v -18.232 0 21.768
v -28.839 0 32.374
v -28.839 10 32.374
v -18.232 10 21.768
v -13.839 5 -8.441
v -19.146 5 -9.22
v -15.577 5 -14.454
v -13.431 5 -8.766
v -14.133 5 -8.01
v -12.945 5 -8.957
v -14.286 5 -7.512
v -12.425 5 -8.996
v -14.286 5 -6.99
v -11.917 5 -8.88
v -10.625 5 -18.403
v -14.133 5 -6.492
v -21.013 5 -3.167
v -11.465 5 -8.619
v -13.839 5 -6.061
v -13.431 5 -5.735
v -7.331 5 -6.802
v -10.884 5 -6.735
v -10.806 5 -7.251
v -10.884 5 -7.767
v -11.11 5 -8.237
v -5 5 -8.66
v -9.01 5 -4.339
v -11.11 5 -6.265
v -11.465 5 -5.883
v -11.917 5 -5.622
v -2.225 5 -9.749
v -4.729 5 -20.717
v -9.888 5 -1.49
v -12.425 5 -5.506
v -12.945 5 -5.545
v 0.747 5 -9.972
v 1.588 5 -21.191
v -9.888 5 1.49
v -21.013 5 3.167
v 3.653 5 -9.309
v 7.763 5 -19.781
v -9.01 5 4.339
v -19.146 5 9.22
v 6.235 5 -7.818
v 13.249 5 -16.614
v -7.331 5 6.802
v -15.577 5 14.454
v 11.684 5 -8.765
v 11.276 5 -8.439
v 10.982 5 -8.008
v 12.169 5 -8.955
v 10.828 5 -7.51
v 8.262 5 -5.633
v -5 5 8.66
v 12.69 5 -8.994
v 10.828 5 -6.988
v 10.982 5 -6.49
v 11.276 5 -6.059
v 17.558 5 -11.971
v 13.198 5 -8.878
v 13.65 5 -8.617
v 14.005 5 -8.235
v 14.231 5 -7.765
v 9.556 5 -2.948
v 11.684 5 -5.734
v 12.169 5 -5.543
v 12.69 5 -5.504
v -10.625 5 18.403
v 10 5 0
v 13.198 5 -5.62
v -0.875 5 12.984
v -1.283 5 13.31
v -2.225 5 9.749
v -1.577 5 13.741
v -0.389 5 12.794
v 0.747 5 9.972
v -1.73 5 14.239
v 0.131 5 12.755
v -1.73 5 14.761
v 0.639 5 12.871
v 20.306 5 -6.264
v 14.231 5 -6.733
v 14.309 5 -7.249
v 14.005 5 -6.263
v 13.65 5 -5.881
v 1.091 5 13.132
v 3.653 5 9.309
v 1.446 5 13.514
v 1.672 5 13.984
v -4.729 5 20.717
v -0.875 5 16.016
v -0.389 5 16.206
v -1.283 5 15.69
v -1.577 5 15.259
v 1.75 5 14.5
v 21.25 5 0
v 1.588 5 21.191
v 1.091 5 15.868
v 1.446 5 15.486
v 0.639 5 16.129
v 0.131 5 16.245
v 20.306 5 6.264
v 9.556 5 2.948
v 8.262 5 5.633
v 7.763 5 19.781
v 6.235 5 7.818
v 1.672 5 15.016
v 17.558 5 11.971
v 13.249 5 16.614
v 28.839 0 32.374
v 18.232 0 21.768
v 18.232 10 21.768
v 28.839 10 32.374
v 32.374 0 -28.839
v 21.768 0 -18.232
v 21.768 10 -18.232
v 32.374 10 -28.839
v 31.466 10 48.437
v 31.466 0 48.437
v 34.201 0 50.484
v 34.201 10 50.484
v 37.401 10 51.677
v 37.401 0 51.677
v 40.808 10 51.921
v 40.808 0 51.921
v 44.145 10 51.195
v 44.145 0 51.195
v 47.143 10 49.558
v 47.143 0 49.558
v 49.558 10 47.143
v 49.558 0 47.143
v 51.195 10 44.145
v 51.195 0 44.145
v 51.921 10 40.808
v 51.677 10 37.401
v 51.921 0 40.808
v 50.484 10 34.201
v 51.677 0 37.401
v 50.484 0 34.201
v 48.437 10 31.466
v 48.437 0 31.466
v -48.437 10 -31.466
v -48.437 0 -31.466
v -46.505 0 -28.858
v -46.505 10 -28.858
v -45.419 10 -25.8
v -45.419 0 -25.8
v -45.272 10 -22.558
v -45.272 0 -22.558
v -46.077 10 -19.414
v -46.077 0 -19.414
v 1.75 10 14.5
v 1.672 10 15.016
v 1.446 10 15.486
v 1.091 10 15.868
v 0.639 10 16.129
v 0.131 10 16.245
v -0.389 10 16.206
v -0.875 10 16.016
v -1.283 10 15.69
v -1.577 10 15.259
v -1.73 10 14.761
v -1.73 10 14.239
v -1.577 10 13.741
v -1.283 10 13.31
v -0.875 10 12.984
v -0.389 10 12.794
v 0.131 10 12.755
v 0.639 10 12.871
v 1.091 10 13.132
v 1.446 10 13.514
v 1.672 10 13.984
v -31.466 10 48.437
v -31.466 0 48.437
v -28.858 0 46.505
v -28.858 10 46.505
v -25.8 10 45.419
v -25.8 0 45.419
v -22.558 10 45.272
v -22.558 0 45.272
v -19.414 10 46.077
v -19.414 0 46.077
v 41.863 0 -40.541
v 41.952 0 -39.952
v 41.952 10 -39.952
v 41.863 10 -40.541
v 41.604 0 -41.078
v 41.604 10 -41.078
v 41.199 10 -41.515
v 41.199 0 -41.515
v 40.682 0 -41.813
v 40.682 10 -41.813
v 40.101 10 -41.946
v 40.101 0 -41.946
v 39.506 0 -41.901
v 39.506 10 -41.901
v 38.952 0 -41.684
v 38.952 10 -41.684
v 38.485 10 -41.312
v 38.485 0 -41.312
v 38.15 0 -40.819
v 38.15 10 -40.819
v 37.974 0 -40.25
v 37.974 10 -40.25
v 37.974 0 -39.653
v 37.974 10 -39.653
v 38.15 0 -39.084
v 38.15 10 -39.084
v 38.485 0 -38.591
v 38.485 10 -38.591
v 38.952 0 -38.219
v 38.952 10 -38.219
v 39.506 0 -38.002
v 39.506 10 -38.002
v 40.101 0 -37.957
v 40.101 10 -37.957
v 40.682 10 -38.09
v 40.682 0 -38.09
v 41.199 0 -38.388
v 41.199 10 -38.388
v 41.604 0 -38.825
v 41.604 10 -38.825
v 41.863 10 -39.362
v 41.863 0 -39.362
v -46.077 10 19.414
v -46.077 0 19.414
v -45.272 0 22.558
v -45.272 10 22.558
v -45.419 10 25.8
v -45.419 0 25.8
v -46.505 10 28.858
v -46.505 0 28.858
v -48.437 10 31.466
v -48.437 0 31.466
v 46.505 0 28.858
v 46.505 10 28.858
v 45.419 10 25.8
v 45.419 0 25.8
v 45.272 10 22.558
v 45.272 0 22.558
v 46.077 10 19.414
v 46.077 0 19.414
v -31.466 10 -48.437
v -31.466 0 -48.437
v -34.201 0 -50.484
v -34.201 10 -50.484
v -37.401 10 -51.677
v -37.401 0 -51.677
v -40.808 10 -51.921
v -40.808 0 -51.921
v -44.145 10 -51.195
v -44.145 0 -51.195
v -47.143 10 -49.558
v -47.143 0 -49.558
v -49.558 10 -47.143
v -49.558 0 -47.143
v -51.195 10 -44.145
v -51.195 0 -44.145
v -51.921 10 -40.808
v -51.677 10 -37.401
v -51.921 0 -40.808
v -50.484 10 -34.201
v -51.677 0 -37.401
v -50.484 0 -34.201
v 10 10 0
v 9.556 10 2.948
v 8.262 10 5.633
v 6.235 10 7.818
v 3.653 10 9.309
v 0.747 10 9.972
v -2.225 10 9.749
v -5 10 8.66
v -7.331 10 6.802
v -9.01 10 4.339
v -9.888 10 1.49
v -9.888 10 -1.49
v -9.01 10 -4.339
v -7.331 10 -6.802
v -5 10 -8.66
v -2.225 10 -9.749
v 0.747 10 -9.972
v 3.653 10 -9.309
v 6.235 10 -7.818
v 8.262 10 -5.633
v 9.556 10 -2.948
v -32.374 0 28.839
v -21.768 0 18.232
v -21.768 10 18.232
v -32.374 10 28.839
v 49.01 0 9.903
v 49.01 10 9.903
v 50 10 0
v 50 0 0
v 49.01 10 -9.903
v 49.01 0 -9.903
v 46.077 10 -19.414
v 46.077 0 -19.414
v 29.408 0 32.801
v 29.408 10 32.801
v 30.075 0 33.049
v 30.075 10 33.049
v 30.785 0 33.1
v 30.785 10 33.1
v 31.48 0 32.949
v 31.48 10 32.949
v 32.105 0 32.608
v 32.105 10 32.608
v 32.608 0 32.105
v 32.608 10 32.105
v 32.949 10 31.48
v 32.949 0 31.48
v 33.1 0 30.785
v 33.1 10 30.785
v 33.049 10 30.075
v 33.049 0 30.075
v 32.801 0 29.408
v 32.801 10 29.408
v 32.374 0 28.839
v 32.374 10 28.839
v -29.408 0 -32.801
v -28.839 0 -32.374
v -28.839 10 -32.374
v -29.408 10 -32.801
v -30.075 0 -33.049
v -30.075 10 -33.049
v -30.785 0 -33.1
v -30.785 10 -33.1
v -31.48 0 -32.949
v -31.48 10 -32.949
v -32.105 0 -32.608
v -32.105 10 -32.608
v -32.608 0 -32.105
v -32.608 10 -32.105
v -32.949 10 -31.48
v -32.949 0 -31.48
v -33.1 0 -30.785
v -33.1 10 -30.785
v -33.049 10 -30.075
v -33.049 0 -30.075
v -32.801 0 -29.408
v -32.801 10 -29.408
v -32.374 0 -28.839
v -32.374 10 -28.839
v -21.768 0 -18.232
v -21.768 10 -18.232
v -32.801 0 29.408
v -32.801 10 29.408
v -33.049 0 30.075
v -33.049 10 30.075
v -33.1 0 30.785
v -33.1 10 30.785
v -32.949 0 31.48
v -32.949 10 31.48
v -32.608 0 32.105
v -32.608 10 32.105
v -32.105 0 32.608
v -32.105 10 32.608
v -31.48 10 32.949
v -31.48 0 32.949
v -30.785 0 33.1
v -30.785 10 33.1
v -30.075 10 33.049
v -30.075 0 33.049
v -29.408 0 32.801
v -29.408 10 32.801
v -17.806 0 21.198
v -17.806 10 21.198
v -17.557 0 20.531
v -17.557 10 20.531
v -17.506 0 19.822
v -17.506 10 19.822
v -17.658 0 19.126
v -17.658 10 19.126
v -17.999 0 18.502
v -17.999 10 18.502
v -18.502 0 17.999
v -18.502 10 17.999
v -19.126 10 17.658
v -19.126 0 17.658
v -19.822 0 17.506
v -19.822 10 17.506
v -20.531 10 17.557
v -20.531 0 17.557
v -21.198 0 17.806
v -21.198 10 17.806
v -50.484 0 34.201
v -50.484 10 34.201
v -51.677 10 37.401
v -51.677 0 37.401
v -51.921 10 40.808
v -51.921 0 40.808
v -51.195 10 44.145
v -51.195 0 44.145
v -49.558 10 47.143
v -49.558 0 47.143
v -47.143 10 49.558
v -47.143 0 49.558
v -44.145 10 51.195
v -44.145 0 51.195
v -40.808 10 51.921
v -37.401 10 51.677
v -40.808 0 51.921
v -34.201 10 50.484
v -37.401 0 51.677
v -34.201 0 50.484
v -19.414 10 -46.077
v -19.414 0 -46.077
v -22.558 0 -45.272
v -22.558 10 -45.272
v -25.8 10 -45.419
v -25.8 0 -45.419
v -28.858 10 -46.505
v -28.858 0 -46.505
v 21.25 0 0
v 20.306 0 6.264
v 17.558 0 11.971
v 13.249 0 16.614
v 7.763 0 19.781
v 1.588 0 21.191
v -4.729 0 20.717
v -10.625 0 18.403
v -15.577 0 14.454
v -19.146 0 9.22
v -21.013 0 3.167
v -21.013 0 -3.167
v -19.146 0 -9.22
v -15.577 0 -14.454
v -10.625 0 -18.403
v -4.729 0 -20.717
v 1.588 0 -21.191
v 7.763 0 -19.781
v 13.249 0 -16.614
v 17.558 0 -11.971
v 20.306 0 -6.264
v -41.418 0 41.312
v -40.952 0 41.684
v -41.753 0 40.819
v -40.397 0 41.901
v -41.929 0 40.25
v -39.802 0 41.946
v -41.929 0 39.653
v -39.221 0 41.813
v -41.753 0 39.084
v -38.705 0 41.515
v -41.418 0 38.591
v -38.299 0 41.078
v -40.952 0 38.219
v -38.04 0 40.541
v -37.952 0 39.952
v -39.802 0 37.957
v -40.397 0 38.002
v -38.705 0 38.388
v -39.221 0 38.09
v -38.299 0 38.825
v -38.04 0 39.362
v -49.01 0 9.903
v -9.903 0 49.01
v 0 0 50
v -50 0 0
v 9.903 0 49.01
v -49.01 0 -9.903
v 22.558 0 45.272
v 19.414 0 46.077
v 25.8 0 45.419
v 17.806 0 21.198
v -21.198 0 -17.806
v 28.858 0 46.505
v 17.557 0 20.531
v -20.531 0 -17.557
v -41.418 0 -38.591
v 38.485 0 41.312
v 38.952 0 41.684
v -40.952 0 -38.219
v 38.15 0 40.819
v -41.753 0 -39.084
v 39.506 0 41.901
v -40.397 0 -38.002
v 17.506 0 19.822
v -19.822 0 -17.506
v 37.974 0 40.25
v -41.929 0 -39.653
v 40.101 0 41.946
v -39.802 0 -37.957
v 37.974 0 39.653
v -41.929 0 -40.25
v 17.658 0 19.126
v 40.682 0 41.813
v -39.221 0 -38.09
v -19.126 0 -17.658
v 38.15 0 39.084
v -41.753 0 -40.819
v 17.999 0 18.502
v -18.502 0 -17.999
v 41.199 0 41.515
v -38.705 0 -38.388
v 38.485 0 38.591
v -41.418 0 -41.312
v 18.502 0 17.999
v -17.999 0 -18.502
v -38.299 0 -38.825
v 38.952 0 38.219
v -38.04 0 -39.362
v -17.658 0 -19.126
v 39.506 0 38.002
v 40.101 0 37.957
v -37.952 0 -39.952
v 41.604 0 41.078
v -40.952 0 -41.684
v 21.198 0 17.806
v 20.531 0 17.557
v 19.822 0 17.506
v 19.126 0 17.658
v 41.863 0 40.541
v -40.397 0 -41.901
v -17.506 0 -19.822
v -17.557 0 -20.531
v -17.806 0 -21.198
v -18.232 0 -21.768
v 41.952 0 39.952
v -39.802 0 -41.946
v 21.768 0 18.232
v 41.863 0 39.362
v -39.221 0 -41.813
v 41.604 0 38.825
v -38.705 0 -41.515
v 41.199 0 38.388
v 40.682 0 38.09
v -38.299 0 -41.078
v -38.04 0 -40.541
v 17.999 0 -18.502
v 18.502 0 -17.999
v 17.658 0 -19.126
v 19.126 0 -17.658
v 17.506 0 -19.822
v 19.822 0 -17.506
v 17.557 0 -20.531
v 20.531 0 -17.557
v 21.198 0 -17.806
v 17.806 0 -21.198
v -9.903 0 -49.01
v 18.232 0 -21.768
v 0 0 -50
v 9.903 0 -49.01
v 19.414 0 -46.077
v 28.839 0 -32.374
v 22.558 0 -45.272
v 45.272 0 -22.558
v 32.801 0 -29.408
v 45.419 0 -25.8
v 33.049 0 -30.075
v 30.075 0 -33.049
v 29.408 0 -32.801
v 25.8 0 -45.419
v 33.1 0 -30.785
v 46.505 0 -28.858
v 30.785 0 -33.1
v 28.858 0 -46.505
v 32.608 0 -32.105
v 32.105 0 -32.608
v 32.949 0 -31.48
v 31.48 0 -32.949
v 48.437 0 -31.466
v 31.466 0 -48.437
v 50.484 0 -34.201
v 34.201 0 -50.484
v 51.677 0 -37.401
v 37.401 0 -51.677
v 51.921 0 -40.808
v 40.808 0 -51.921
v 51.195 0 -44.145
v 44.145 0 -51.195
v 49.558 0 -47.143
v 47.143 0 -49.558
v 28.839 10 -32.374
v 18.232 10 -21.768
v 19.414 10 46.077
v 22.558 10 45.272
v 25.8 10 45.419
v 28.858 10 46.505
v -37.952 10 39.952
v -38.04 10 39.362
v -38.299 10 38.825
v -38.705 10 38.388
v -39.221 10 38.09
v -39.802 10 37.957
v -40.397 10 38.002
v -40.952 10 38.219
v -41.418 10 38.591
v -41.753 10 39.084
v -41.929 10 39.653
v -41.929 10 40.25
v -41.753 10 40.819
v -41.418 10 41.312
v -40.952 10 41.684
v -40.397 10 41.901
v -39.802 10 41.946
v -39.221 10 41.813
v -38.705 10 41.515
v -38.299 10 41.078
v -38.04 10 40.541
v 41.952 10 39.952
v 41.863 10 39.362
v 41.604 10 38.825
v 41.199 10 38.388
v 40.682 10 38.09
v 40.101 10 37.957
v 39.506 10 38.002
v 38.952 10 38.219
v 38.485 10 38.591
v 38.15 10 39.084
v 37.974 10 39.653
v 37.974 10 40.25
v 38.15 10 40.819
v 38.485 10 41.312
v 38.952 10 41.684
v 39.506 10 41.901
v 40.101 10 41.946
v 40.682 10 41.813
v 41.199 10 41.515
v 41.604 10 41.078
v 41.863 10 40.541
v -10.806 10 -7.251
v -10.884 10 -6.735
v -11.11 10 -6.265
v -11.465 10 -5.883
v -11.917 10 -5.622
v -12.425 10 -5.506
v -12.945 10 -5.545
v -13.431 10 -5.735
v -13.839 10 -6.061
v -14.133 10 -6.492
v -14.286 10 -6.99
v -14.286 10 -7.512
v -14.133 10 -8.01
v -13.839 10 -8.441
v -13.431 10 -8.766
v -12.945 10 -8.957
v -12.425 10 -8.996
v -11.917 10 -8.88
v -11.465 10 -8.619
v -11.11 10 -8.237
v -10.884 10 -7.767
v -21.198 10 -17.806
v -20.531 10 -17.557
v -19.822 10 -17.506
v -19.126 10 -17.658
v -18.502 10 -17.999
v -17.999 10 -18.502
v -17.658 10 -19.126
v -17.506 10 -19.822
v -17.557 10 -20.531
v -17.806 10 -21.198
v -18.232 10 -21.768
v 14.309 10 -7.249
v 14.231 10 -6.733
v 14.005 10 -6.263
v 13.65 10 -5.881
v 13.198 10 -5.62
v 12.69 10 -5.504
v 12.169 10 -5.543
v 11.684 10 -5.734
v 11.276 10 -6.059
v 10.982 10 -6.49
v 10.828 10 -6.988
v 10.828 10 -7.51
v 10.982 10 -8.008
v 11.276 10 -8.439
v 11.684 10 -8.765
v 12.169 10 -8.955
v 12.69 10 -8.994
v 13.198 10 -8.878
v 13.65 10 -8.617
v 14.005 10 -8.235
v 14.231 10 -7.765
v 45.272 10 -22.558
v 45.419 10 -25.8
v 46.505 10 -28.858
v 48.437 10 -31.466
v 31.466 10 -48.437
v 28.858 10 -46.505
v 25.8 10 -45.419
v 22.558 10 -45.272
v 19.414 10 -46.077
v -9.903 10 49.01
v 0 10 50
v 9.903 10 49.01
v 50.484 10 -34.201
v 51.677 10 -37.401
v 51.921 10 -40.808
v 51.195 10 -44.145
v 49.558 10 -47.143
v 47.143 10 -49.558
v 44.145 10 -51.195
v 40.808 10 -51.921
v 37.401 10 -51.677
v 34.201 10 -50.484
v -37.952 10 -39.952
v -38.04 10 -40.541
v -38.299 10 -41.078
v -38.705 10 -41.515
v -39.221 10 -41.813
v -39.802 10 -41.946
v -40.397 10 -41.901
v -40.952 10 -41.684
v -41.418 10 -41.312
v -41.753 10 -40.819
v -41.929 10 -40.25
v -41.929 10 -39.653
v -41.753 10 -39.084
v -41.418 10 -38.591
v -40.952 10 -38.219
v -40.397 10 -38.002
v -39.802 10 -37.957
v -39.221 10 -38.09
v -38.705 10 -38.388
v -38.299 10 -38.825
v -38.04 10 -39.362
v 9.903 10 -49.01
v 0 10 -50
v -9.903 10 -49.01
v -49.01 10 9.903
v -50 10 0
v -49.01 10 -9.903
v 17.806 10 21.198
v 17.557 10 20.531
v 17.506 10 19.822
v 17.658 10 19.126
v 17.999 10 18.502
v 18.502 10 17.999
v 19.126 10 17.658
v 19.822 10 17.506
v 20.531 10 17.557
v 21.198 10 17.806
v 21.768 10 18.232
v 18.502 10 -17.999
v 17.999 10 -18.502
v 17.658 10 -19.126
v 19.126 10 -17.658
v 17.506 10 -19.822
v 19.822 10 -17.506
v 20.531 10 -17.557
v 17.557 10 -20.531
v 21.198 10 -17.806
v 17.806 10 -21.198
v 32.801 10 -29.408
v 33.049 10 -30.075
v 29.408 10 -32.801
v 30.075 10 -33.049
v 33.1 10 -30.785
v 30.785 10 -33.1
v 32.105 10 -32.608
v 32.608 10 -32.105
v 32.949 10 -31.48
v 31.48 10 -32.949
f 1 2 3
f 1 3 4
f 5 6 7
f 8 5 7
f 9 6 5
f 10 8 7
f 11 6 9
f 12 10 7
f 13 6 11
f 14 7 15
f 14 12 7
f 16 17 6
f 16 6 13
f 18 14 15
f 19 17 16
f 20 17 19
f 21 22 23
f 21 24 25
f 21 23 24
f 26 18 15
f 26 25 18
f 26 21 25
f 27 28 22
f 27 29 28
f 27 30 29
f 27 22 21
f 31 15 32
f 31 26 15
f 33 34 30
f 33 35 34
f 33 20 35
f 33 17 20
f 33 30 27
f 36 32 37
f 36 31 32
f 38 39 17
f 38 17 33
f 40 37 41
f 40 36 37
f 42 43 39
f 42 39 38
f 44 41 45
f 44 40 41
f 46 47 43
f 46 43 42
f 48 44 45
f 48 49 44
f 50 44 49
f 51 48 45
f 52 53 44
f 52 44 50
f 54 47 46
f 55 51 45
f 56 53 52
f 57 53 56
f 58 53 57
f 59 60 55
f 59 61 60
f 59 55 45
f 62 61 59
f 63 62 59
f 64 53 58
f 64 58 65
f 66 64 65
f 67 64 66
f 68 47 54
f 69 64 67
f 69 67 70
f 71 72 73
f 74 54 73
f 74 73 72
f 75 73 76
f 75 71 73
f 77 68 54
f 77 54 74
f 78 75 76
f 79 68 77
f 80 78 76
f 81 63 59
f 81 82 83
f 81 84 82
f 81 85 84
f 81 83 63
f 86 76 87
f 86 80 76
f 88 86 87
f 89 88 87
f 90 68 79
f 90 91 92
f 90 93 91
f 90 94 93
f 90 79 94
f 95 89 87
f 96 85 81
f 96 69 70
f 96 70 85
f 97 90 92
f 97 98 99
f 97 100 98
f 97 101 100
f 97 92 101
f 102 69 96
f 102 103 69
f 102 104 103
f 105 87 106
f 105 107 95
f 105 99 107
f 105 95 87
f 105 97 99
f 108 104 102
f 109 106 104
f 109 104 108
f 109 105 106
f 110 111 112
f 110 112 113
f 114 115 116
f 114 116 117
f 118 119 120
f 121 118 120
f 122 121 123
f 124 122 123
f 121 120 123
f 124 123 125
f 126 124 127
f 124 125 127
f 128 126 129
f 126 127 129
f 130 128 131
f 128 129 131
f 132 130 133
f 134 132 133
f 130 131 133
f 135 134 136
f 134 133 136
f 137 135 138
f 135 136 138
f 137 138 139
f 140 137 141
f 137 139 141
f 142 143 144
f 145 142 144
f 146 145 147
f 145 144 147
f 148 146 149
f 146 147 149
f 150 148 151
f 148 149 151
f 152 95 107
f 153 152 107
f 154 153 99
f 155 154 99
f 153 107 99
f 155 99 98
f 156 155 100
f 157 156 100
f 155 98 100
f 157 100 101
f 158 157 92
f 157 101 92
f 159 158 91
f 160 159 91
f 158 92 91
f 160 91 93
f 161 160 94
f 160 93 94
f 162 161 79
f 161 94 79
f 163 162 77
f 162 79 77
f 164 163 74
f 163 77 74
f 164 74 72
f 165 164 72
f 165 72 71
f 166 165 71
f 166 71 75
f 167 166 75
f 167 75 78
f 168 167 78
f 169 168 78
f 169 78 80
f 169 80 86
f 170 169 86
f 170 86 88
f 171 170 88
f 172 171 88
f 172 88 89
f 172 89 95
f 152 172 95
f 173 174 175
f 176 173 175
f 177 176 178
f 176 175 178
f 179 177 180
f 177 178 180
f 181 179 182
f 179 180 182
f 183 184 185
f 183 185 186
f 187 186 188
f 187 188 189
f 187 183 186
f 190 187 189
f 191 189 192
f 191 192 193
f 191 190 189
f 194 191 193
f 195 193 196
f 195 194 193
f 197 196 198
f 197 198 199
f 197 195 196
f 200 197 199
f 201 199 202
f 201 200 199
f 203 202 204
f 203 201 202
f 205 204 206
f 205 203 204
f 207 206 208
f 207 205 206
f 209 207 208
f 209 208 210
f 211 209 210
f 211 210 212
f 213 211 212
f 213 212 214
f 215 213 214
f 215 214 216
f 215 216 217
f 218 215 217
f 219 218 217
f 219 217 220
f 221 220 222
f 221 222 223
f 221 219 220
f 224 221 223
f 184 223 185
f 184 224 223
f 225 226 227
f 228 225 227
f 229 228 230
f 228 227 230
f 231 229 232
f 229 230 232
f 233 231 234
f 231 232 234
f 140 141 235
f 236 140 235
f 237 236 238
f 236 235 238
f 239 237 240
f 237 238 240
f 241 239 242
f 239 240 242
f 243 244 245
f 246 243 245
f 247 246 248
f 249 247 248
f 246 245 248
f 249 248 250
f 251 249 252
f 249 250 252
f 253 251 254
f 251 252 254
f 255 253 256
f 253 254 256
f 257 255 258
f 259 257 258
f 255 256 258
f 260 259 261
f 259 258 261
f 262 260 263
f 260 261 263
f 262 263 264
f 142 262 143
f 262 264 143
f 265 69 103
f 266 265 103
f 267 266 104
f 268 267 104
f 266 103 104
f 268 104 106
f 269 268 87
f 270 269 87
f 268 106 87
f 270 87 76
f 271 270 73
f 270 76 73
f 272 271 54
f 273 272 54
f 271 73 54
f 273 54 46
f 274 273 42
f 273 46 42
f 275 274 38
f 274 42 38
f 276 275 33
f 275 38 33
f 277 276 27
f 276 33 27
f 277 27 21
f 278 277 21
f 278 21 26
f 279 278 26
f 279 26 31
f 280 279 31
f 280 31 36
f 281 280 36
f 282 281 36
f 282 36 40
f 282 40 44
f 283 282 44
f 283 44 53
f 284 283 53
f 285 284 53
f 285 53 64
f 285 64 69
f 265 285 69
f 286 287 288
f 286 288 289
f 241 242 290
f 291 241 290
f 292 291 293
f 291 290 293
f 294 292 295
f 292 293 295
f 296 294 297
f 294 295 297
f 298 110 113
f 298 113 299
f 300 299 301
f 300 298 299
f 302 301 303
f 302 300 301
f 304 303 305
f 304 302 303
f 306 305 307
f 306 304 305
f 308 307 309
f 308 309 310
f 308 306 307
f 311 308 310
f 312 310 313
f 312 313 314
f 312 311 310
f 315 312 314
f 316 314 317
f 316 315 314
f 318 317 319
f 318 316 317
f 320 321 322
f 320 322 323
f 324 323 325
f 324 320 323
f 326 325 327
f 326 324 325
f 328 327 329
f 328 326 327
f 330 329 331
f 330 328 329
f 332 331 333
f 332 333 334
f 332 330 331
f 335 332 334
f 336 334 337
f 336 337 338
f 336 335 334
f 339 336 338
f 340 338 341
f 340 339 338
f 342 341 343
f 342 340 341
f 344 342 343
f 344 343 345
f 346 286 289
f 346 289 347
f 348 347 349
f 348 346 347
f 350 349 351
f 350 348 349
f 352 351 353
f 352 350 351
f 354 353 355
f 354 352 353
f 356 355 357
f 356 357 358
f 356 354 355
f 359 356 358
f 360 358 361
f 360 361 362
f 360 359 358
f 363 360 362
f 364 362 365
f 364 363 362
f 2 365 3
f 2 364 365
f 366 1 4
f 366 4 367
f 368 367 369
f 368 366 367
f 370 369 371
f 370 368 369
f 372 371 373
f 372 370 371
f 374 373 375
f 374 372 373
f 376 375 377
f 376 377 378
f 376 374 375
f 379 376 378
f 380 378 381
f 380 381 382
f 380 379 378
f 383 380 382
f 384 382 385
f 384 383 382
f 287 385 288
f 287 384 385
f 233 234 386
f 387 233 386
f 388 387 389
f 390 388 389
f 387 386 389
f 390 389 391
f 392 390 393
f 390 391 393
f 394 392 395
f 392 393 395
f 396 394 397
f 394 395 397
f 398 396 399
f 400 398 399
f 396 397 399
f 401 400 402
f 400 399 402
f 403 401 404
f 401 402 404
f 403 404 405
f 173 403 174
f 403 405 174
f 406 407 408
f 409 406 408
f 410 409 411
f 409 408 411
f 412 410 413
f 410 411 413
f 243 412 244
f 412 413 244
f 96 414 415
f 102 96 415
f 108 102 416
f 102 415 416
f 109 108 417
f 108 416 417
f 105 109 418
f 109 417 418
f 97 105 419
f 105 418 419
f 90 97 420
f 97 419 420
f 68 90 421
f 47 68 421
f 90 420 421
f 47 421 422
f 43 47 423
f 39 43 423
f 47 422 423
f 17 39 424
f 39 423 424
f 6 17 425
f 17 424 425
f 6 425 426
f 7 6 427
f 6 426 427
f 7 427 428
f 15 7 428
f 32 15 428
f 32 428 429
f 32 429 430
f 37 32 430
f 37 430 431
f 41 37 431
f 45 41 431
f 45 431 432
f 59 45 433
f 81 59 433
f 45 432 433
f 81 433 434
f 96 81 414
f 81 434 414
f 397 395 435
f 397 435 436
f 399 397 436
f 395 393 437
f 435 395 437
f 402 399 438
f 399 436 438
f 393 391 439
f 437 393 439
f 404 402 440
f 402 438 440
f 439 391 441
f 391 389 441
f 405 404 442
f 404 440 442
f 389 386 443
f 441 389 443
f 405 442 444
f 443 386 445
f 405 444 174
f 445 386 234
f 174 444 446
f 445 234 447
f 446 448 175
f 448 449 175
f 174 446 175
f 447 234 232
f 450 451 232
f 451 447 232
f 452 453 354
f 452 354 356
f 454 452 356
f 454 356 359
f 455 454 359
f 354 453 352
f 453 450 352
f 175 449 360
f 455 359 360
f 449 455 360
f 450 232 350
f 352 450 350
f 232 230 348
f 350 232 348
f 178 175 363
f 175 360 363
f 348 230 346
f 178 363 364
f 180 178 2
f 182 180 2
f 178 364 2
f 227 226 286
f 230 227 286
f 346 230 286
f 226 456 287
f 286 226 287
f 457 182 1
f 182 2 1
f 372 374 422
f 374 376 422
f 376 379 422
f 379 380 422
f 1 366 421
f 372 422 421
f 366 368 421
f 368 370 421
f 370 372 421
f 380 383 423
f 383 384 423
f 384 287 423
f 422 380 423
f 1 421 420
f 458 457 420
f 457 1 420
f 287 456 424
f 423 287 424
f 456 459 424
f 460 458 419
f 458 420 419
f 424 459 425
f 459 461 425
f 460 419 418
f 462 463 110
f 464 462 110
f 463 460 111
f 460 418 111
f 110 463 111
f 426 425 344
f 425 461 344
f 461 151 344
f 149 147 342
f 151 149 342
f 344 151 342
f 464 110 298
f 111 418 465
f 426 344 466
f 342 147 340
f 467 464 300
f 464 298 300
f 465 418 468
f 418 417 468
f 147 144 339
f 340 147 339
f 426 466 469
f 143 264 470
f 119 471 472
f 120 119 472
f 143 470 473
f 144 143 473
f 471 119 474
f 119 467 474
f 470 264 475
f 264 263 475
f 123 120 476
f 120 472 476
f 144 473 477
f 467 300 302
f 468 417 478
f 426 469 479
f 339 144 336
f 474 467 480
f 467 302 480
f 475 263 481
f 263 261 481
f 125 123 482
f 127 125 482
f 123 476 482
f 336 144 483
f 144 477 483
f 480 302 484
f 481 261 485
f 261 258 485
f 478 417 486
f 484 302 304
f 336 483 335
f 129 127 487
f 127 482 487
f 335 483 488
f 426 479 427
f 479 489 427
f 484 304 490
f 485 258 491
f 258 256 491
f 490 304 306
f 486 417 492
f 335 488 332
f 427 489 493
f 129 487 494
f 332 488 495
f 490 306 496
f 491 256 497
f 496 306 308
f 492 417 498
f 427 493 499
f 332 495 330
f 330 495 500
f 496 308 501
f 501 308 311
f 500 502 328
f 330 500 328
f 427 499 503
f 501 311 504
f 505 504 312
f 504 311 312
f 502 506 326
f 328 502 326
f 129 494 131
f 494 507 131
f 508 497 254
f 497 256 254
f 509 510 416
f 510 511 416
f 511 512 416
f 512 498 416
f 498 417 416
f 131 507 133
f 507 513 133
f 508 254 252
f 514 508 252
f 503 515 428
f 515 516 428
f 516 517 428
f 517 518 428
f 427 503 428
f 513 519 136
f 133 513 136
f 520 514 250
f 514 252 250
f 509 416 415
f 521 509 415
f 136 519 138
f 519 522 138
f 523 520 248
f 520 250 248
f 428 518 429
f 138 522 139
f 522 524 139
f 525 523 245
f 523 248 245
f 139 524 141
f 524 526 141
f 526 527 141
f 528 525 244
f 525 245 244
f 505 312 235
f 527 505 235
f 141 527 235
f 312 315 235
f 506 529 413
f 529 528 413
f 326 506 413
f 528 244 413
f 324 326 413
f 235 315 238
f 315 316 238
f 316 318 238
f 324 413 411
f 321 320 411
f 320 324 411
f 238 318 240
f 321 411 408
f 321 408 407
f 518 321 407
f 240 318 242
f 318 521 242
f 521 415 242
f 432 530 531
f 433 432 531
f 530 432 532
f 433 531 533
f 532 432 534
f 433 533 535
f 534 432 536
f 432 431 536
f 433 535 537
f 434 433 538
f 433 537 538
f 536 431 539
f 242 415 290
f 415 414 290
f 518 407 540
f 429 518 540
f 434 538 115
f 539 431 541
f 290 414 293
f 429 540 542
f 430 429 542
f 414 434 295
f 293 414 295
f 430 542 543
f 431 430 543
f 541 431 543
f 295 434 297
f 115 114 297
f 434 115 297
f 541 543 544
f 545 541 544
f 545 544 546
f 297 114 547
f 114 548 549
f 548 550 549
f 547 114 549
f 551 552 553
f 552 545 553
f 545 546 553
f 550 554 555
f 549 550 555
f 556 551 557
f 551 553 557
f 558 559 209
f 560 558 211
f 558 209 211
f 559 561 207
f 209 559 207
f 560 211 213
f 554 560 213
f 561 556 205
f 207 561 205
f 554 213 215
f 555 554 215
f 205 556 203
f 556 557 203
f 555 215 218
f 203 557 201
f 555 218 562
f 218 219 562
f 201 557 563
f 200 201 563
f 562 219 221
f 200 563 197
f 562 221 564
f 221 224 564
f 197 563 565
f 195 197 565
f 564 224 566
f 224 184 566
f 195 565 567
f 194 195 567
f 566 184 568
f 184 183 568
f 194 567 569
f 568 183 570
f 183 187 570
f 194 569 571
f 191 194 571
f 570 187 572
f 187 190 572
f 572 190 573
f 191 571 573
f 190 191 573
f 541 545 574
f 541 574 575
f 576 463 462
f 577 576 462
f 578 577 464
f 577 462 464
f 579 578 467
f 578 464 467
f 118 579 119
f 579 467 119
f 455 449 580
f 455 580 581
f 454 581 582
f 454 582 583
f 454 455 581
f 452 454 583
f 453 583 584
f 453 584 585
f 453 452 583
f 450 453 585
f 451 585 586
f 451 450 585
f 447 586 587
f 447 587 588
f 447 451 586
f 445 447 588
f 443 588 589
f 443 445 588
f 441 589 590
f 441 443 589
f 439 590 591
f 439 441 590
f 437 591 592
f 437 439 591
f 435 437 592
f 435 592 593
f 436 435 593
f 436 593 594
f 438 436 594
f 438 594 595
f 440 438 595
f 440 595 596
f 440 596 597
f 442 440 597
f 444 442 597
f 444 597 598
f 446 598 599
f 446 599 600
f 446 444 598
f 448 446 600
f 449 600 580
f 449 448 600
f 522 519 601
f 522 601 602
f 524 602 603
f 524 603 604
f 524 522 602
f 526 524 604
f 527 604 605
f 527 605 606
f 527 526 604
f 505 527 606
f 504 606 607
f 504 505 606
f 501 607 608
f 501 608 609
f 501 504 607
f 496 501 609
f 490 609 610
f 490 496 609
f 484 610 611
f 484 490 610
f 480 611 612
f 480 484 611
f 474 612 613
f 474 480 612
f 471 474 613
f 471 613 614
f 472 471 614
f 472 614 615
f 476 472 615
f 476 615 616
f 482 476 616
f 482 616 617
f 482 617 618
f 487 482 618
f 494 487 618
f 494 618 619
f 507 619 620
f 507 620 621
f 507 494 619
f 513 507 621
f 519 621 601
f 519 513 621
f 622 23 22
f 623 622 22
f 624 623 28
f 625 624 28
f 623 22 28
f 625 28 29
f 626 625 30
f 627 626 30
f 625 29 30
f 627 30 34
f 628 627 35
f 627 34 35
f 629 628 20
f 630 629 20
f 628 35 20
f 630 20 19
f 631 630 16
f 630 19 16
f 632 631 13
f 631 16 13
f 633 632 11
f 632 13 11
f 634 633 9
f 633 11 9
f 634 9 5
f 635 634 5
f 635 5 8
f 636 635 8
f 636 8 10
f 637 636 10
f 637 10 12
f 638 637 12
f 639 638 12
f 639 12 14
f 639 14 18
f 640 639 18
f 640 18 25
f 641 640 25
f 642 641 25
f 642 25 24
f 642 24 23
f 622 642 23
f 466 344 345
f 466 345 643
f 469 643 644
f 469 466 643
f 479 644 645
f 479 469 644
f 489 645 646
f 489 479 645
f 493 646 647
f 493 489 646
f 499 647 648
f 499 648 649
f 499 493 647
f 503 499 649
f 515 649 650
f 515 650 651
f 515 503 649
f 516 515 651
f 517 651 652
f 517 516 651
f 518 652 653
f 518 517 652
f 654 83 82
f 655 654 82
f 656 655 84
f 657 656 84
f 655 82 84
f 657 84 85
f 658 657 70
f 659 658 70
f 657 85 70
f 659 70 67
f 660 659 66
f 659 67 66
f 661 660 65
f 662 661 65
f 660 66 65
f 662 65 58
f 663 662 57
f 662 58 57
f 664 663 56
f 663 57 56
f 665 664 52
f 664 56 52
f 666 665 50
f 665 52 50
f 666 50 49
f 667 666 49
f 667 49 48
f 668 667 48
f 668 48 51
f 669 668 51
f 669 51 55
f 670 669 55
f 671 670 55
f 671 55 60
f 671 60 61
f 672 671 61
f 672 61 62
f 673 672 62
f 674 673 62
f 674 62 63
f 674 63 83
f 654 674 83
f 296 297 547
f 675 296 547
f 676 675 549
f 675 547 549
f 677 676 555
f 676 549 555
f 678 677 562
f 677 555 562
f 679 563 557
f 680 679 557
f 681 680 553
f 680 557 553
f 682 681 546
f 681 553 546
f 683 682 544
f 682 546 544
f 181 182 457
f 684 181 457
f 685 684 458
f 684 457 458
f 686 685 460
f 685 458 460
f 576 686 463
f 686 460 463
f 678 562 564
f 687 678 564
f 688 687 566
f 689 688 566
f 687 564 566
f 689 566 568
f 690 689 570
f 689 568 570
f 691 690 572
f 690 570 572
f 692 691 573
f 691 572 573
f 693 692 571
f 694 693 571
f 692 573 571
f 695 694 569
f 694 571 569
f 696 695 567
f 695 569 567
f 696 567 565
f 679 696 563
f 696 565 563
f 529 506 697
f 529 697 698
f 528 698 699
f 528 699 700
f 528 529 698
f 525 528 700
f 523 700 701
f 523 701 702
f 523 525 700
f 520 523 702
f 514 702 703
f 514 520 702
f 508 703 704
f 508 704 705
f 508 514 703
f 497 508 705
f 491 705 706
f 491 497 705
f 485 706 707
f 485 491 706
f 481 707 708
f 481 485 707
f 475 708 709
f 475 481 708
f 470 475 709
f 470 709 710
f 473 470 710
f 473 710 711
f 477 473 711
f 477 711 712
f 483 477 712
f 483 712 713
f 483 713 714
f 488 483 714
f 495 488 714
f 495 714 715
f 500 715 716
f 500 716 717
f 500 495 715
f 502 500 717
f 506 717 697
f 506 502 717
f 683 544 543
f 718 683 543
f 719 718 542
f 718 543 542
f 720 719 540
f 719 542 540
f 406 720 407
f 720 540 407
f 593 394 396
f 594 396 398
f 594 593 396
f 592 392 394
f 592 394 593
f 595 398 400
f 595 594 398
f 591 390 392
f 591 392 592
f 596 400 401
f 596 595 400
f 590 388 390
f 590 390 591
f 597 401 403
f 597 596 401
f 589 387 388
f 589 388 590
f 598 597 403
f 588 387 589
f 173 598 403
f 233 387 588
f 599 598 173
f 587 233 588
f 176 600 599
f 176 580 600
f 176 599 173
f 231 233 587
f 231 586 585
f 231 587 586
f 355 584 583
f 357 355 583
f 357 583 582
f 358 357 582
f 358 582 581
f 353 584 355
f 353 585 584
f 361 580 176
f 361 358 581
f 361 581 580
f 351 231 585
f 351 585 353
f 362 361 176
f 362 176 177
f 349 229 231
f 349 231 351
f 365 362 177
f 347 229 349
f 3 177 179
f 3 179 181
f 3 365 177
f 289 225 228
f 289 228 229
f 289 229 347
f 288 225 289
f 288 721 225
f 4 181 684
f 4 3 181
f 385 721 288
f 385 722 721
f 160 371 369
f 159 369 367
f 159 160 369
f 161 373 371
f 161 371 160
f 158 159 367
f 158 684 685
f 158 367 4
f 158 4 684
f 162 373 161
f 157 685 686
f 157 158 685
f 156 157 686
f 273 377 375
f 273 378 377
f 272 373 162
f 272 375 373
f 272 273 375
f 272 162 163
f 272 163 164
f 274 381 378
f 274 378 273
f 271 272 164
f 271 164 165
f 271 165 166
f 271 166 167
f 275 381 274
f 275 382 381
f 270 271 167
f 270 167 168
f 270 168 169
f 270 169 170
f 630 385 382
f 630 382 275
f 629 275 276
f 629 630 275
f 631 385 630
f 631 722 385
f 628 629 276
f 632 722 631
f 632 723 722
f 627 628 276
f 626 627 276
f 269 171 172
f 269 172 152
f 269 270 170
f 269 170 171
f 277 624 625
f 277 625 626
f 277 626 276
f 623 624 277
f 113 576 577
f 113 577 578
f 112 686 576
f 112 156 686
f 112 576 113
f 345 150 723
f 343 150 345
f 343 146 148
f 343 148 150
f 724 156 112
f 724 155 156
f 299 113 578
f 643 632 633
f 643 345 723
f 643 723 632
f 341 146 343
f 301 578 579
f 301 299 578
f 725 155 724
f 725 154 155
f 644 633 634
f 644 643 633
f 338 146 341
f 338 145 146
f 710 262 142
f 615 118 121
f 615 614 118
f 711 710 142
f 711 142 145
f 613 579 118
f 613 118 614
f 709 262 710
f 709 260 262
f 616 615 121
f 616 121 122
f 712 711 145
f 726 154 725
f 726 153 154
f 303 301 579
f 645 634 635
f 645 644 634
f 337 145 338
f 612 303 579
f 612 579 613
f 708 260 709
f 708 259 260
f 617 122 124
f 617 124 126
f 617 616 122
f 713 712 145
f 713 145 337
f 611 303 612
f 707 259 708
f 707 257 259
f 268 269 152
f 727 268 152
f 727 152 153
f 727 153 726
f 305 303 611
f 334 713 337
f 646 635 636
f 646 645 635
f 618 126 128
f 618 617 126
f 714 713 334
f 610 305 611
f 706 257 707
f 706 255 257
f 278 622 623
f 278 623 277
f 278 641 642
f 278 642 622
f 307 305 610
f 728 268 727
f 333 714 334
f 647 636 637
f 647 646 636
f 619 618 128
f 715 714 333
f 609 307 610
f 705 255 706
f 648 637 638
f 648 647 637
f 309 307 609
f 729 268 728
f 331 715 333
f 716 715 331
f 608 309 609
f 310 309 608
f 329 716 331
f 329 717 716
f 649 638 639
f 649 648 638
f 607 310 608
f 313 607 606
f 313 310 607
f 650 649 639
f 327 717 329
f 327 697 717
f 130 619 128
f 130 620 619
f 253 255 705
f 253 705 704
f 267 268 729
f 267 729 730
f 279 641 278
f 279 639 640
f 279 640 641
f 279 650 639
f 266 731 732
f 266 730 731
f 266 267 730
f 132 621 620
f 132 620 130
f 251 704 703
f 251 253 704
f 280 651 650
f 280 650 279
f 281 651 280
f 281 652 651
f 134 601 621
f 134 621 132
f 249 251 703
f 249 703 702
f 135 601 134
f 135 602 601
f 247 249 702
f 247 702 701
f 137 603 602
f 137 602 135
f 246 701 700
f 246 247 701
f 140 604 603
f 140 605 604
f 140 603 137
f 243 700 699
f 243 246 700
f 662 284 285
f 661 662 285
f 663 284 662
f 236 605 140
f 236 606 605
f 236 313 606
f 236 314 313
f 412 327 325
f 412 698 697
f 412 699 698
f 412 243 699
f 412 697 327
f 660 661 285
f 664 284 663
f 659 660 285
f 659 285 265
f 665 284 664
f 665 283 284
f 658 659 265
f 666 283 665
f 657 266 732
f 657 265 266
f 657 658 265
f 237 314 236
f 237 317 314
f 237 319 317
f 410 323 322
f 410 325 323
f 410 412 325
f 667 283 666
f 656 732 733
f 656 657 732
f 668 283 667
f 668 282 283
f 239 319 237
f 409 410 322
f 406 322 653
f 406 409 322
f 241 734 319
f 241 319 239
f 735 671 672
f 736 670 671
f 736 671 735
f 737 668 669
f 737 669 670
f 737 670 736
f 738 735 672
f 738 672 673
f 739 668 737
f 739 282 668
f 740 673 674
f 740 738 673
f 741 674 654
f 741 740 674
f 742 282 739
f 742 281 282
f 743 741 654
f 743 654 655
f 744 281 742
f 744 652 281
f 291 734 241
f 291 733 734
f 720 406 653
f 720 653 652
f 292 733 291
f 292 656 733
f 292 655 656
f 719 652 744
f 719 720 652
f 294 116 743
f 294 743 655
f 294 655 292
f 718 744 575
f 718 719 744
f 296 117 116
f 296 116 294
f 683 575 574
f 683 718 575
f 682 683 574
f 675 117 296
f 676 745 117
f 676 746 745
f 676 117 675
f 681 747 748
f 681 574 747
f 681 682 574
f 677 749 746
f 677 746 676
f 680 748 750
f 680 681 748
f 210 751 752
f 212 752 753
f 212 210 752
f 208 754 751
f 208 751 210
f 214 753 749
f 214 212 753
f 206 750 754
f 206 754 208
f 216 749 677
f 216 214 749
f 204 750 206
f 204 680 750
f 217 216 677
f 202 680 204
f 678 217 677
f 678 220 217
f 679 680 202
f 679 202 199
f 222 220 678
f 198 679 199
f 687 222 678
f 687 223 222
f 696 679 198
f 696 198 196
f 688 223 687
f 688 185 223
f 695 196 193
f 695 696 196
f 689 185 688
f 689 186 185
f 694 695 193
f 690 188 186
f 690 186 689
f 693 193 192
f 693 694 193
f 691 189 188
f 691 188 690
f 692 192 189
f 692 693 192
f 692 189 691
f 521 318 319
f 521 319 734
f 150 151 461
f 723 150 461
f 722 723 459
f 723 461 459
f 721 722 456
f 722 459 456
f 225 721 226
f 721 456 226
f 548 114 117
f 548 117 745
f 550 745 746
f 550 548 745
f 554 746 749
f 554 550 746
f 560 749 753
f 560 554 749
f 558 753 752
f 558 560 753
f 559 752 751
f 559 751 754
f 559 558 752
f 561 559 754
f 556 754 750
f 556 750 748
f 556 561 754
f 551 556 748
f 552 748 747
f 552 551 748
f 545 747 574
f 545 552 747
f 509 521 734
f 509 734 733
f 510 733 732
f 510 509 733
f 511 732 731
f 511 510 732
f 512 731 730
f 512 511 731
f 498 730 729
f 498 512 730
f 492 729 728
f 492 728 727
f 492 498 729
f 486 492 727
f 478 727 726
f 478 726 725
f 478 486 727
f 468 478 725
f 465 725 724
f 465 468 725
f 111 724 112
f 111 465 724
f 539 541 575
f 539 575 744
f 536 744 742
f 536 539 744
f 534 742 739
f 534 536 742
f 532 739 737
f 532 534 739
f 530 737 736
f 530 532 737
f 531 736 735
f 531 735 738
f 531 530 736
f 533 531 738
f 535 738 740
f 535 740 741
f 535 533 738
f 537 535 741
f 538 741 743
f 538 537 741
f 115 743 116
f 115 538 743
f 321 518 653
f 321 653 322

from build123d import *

# Parameters (mm, degrees)
SZKIC1_R                    = 2
DODANIE_WYCI_GNI_CIE1_DEPTH = 10
SZKIC2_R                    = 21.25
SZKIC2_R_2                  = 1.75
SZKIC2_R_3                  = 10
WYTNIJ_WYCI_GNI_CIE3_DEPTH  = 5
SZKIC2_8_R                  = 1.75
SZKIC2_8_R_2                = 10
WYTNIJ_WYCI_GNI_CIE6_DEPTH  = 75.1479844


with BuildPart() as part:
    # Szkic1 → Dodanie-wyci_gni_cie1 (new body)
    with BuildSketch(Plane(origin=(0, 0, 0), x_dir=(1, 0, 0), z_dir=(0, 1, 0))):
        with BuildLine():
            ThreePointArc((46.077281732, -19.413503243), (50, 0), (46.077281732, 19.413503243))
            ThreePointArc((46.077281732, 19.413503243), (45.41900176, 25.799706685), (48.436814511, 31.466251763))
            ThreePointArc((48.436814511, 31.466251763), (48.436814511, 48.436814511), (31.466251763, 48.436814511))
            ThreePointArc((31.466251763, 48.436814511), (25.799706685, 45.41900176), (19.413503243, 46.077281732))
            ThreePointArc((19.413503243, 46.077281732), (0, 50), (-19.413503243, 46.077281732))
            ThreePointArc((-19.413503243, 46.077281732), (-25.799706685, 45.41900176), (-31.466251763, 48.436814511))
            ThreePointArc((-31.466251763, 48.436814511), (-48.436814511, 48.436814511), (-48.436814511, 31.466251763))
            ThreePointArc((-48.436814511, 31.466251763), (-45.41900176, 25.799706685), (-46.077281732, 19.413503243))
            ThreePointArc((-46.077281732, 19.413503243), (-50, 0), (-46.077281732, -19.413503243))
            ThreePointArc((-46.077281732, -19.413503243), (-45.41900176, -25.799706685), (-48.436814511, -31.466251763))
            ThreePointArc((-48.436814511, -31.466251763), (-48.436814511, -48.436814511), (-31.466251763, -48.436814511))
            ThreePointArc((-31.466251763, -48.436814511), (-25.799706685, -45.41900176), (-19.413503243, -46.077281732))
            ThreePointArc((-19.413503243, -46.077281732), (0, -50), (19.413503243, -46.077281732))
            ThreePointArc((19.413503243, -46.077281732), (25.799706685, -45.41900176), (31.466251763, -48.436814511))
            ThreePointArc((31.466251763, -48.436814511), (48.436814511, -48.436814511), (48.436814511, -31.466251763))
            ThreePointArc((48.436814511, -31.466251763), (45.41900176, -25.799706685), (46.077281732, -19.413503243))
        make_face()
        with BuildLine():
            ThreePointArc((-21.767766953, -18.232233047), (-18.232233047, -18.232233047), (-18.232233047, -21.767766953))
            Line((-18.232233047, -21.767766953), (-28.838834765, -32.374368671))
            ThreePointArc((-28.838834765, -32.374368671), (-32.374368671, -32.374368671), (-32.374368671, -28.838834765))
            Line((-32.374368671, -28.838834765), (-21.767766953, -18.232233047))
        make_face(mode=Mode.SUBTRACT)
        with BuildLine():
            ThreePointArc((18.232233047, -21.767766953), (18.232233047, -18.232233047), (21.767766953, -18.232233047))
            Line((21.767766953, -18.232233047), (32.374368671, -28.838834765))
            ThreePointArc((32.374368671, -28.838834765), (32.374368671, -32.374368671), (28.838834765, -32.374368671))
            Line((28.838834765, -32.374368671), (18.232233047, -21.767766953))
        make_face(mode=Mode.SUBTRACT)
        with BuildLine():
            ThreePointArc((-18.232233047, 21.767766953), (-18.232233047, 18.232233047), (-21.767766953, 18.232233047))
            Line((-21.767766953, 18.232233047), (-32.374368671, 28.838834765))
            ThreePointArc((-32.374368671, 28.838834765), (-32.374368671, 32.374368671), (-28.838834765, 32.374368671))
            Line((-28.838834765, 32.374368671), (-18.232233047, 21.767766953))
        make_face(mode=Mode.SUBTRACT)
        with BuildLine():
            ThreePointArc((21.767766953, 18.232233047), (18.232233047, 18.232233047), (18.232233047, 21.767766953))
            Line((18.232233047, 21.767766953), (28.838834765, 32.374368671))
            ThreePointArc((28.838834765, 32.374368671), (32.374368671, 32.374368671), (32.374368671, 28.838834765))
            Line((32.374368671, 28.838834765), (21.767766953, 18.232233047))
        make_face(mode=Mode.SUBTRACT)
        with Locations((39.951533137, -39.951533137)):
            Circle(SZKIC1_R, mode=Mode.SUBTRACT)
        with Locations((-39.951533137, -39.951533137)):
            Circle(SZKIC1_R, mode=Mode.SUBTRACT)
        with Locations((-39.951533137, 39.951533137)):
            Circle(SZKIC1_R, mode=Mode.SUBTRACT)
        with Locations((39.951533137, 39.951533137)):
            Circle(SZKIC1_R, mode=Mode.SUBTRACT)
    extrude(amount=DODANIE_WYCI_GNI_CIE1_DEPTH)

    # Szkic2 → Wytnij-wyci_gni_cie3 (cut)
    with BuildSketch(Plane.XZ):
        Circle(SZKIC2_R)
        with Locations((0, 14.5)):
            Circle(SZKIC2_R_2, mode=Mode.SUBTRACT)
        with Locations((12.558868355, -7.249133975)):
            Circle(SZKIC2_R_2, mode=Mode.SUBTRACT)
        with Locations((-12.555868355, -7.250866025)):
            Circle(SZKIC2_R_2, mode=Mode.SUBTRACT)
        Circle(SZKIC2_R_3, mode=Mode.SUBTRACT)
    extrude(amount=-WYTNIJ_WYCI_GNI_CIE3_DEPTH, mode=Mode.SUBTRACT)

    # Szkic2_8 → Wytnij-wyci_gni_cie6 (cut, through all)
    with BuildSketch(Plane.XZ):
        with Locations((0, 14.5)):
            Circle(SZKIC2_8_R)
        with Locations((12.558868355, -7.249133975)):
            Circle(SZKIC2_8_R)
        with Locations((-12.555868355, -7.250866025)):
            Circle(SZKIC2_8_R)
        Circle(SZKIC2_8_R_2)
    extrude(amount=-WYTNIJ_WYCI_GNI_CIE6_DEPTH, mode=Mode.SUBTRACT)


solid = part.part
